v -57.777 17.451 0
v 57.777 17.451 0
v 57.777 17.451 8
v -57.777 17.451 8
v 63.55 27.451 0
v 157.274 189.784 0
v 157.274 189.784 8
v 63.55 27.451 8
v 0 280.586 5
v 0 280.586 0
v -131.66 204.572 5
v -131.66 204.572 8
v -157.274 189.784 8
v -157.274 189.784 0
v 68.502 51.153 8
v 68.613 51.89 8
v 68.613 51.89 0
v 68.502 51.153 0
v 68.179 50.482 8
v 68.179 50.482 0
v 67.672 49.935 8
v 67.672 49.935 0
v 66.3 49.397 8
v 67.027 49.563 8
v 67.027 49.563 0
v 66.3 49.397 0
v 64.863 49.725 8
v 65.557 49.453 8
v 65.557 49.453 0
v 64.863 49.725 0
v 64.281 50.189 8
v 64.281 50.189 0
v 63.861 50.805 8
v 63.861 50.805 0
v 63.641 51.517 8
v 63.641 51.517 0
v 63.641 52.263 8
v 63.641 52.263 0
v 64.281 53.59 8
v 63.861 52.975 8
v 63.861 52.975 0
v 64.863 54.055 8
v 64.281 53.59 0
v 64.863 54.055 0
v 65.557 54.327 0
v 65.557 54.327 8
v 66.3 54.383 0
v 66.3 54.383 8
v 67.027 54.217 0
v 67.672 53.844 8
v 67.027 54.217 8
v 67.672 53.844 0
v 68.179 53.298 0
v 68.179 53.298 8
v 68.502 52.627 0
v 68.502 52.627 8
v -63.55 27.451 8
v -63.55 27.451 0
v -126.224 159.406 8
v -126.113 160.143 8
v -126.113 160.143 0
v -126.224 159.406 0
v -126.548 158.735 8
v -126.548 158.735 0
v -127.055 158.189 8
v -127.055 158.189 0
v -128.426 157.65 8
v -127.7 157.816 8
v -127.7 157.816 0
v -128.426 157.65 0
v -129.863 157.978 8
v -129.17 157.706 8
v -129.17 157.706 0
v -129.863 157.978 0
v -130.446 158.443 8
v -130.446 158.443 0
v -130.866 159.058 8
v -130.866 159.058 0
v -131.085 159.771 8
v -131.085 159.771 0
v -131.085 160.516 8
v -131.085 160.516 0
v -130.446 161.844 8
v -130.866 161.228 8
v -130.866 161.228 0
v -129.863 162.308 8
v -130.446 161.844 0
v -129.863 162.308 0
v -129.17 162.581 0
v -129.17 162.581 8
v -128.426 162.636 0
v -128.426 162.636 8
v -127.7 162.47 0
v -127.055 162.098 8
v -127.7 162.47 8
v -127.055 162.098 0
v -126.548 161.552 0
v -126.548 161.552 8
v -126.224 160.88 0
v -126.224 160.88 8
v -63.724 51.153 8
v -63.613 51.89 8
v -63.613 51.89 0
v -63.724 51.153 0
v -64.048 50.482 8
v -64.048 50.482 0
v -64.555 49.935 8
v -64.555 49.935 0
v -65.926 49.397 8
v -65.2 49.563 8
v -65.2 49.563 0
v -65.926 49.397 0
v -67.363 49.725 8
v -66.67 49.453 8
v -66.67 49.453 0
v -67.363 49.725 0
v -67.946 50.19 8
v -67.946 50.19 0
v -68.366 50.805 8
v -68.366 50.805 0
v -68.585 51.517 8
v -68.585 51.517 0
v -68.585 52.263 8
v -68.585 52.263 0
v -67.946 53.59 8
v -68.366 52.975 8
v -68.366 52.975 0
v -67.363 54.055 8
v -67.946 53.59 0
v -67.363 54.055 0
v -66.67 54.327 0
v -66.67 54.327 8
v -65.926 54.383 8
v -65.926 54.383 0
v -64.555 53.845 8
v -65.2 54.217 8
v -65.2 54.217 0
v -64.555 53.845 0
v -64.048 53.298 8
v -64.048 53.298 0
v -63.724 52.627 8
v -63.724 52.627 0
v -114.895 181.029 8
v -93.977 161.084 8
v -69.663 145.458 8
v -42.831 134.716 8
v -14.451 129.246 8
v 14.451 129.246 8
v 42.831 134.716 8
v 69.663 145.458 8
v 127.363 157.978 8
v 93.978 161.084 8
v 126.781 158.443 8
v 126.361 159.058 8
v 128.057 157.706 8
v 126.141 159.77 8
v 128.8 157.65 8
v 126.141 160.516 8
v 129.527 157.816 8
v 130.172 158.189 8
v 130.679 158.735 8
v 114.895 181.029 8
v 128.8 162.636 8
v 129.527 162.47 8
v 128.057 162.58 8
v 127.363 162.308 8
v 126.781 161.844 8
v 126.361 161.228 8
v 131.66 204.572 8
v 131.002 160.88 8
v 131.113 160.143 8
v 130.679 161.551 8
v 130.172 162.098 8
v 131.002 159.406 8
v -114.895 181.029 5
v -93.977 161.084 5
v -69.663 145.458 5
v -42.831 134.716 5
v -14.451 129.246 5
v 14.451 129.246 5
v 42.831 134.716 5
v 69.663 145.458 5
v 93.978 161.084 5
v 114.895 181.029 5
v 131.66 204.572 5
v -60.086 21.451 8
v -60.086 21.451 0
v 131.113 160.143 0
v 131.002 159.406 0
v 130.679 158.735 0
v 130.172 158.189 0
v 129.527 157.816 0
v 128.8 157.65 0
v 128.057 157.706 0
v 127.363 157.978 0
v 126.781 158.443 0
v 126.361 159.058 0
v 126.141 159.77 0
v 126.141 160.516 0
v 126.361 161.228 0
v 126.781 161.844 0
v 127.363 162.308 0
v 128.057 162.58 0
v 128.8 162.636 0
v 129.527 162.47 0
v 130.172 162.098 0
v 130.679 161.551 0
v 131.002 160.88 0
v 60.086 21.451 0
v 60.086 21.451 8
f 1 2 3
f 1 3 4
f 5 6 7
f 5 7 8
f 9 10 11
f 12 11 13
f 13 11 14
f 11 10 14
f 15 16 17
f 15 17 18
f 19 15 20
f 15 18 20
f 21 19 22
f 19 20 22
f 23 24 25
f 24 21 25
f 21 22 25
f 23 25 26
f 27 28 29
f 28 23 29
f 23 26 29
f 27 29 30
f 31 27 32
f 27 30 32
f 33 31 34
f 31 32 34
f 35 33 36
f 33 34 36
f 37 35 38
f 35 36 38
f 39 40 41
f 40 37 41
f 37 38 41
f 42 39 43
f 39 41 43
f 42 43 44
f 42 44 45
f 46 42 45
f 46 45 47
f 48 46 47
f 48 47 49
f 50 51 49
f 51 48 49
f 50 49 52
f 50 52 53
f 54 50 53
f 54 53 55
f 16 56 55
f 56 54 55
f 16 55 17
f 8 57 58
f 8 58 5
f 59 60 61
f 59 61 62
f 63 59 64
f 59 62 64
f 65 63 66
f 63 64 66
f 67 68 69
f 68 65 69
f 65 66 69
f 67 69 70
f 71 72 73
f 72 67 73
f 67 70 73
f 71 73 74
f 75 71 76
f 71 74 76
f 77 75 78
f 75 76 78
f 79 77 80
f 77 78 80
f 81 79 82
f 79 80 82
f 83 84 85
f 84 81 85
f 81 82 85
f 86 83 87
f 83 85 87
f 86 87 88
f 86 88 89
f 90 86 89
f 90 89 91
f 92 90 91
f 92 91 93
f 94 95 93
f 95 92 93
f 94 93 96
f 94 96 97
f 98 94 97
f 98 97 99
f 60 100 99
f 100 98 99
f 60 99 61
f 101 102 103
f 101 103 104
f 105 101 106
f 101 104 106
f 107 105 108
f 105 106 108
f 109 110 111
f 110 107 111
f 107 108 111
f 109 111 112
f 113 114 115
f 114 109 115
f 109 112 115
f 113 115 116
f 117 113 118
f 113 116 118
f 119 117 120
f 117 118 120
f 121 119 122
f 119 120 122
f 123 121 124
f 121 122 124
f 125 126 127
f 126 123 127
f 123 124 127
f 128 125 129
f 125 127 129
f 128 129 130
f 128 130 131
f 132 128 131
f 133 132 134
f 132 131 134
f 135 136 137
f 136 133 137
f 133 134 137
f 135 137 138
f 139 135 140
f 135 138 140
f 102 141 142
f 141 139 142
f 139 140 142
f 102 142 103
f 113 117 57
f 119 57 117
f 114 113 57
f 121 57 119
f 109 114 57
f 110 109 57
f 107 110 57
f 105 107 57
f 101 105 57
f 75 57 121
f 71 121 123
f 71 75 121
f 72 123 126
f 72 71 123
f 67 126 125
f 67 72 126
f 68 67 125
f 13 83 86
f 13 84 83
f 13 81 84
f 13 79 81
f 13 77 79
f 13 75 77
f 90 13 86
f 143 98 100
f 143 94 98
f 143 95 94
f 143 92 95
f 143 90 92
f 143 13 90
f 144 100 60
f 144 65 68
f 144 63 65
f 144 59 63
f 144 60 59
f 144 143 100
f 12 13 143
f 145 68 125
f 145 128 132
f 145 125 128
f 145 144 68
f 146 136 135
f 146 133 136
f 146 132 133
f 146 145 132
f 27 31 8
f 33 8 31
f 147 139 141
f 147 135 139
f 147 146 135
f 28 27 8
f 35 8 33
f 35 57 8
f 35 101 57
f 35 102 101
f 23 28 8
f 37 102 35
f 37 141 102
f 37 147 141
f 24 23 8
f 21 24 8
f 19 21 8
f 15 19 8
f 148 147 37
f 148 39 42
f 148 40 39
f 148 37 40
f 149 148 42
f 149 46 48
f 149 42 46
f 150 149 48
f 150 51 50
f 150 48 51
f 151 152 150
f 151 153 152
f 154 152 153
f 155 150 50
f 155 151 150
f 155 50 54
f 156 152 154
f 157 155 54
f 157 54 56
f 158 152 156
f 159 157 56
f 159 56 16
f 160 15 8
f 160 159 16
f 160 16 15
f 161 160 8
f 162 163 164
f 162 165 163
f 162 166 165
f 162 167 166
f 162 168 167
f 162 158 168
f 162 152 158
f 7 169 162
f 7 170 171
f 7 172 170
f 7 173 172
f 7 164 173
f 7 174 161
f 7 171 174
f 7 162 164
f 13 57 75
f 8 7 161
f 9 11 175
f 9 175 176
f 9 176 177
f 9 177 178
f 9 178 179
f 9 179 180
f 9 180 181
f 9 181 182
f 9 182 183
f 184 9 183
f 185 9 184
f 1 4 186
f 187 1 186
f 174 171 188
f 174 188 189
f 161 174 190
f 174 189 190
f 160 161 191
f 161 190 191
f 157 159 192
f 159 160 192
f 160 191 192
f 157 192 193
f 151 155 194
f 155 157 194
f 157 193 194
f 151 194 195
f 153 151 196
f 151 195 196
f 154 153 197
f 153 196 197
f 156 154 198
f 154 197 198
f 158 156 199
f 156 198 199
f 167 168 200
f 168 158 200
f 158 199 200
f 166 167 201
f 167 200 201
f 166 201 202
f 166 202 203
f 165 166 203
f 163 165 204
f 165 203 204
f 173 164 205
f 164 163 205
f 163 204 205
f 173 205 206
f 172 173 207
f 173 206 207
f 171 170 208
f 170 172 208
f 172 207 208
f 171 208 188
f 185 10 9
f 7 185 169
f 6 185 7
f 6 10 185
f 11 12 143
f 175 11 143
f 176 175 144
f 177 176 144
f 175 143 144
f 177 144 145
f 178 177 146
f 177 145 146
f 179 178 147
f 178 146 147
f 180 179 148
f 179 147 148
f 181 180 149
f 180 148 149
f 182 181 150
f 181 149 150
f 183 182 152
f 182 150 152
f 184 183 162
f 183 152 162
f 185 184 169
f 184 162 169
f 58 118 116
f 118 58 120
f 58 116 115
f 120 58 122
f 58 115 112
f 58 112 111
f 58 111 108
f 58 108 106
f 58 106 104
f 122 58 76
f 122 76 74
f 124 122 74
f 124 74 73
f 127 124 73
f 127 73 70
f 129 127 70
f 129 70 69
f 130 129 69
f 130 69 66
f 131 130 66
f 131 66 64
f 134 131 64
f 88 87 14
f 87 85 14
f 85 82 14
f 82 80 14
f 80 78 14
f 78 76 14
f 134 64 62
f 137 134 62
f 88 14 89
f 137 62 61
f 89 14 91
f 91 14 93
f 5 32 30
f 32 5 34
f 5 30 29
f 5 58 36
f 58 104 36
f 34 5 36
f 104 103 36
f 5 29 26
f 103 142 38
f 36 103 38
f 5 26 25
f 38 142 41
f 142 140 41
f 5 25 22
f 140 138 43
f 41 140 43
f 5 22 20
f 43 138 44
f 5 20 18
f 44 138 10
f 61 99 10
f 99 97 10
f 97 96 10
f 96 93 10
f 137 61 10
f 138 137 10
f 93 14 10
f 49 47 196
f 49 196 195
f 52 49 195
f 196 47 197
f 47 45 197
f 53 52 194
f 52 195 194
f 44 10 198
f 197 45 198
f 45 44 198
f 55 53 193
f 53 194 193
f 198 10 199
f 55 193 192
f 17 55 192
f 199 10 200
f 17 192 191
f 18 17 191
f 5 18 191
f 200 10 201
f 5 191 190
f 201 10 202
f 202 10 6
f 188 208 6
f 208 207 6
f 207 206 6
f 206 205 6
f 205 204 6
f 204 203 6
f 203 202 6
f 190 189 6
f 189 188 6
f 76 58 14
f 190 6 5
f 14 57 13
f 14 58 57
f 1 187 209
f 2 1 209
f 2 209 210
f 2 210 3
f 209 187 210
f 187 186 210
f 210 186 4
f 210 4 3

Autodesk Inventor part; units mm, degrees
ref_plane "YZ Plane" through (0, 0, 0) normal (1, 0, 0) x (0, 1, 0)
ref_plane "XZ Plane" through (0, 0, 0) normal (0, 1, 0) x (-1, 0, 0)
ref_plane "XY Plane" through (0, 0, 0) normal (0, 0, 1) x (1, 0, 0)
sketch "Sketch1" plane through (0, 0, 0) normal (0, 0, 1) x (1, 0, 0)
  arc A0 (-16.5011, 13.8506) -> (-21.6973, 4.8506) centre (-16.5011, 7.8506) ccw projected
  line L0 (-16.5011, 13.8506) -> (16.5011, 13.8506) projected
  arc A1 (21.6973, 4.8506) -> (16.5011, 13.8506) centre (16.5011, 7.8506) ccw projected
  line L1 (21.6973, 4.8506) -> (13.3257, -9.6494) projected
  arc A2 (5.5315, -14.1494) -> (13.3257, -9.6494) centre (5.5315, -5.1494) ccw projected
  line L2 (5.5315, -14.1494) -> (-5.5315, -14.1494) projected
  arc A3 (-13.3257, -9.6494) -> (-5.5315, -14.1494) centre (-5.5315, -5.1494) ccw projected
  line L3 (-13.3257, -9.6494) -> (-21.6973, 4.8506) projected
  line L4 (10, -20.5494) -> (10, -40.5494) projected
  line L5 (10, -40.5494) -> (-10, -40.5494) projected
  line L6 (-10, -40.5494) -> (-10, -20.5494) projected
  line L7 (-10, -20.5494) -> (10, -20.5494) projected
  line L8 (-15, -16.7494) -> (-32.2735, -26.7222) projected
  arc A4 (-32.2735, -26.7222) -> (32.2735, -26.7222) centre (0, -5.7301) ccw projected
  line L9 (32.2735, -26.7222) -> (15, -16.7494) projected
  line L10 (23.4871, 17.4506) -> (-23.4871, 17.4506)
  arc A5 (-222.749, 428.2443) -> (-227.9452, 437.2443) centre (-227.9452, 431.2443) ccw projected
  line L11 (-222.749, 428.2443) -> (-239.2501, 399.6635) projected
  arc A6 (-249.6424, 399.6635) -> (-239.2501, 399.6635) centre (-244.4463, 402.6635) ccw projected
  line L12 (-249.6424, 399.6635) -> (-258.014, 414.1635) projected
  arc A7 (-258.014, 423.1635) -> (-258.014, 414.1635) centre (-250.2198, 418.6635) ccw projected
  line L13 (-258.014, 423.1635) -> (-252.4825, 432.7443) projected
  arc A8 (-244.6883, 437.2443) -> (-252.4825, 432.7443) centre (-244.6883, 428.2443) ccw projected
  line L14 (-244.6883, 437.2443) -> (-227.9452, 437.2443) projected
  line L15 (-265.7908, 422.4937) -> (-283.1113, 432.4937) projected
  line L16 (-283.1113, 432.4937) -> (-273.1113, 449.8142) projected
  line L17 (-273.1113, 449.8142) -> (-255.7908, 439.8142) projected
  line L18 (-255.7908, 439.8142) -> (-265.7908, 422.4937) projected
  line L19 (-193.9999, 442.2443) -> (-249.9999, 442.2443) projected
  line L20 (-249.9999, 442.2443) -> (-249.9999, 462.19) projected
  arc A9 (-249.9999, 462.19) -> (-282.2735, 406.2907) centre (-247.957, 423.7443) ccw projected
  line L21 (-282.2735, 406.2907) -> (-264.9999, 416.2635) projected
  line L22 (-264.9999, 416.2635) -> (-237, 367.7661) projected
  line L23 (-237, 367.7661) -> (-232.6699, 370.2661) projected
  line L24 (-232.6699, 370.2661) -> (-239.6254, 382.3135) projected
  arc A10 (-239.6254, 391.8135) -> (-239.6254, 382.3135) centre (-231.3982, 387.0635) ccw projected
  line L25 (-239.6254, 391.8135) -> (-216.1383, 432.4943) projected
  arc A11 (-207.9111, 437.2443) -> (-216.1383, 432.4943) centre (-207.9111, 427.7443) ccw projected
  line L26 (-207.9111, 437.2443) -> (-193.9999, 437.2443) projected
  line L27 (-193.9999, 437.2443) -> (-193.9999, 442.2443) projected
  arc A12 (239.2502, 399.6633) -> (249.6425, 399.6633) centre (244.4464, 402.6633) ccw projected
  line L28 (239.2502, 399.6633) -> (222.7491, 428.2441) projected
  arc A13 (227.9453, 437.2441) -> (222.7491, 428.2441) centre (227.9453, 431.2441) ccw projected
  line L29 (227.9453, 437.2441) -> (244.6884, 437.2441) projected
  arc A14 (252.4827, 432.7441) -> (244.6884, 437.2441) centre (244.6884, 428.2441) ccw projected
  line L30 (252.4827, 432.7441) -> (258.0141, 423.1633) projected
  arc A15 (258.0141, 414.1633) -> (258.0141, 423.1633) centre (250.2199, 418.6633) ccw projected
  line L31 (258.0141, 414.1633) -> (249.6425, 399.6633) projected
  line L32 (255.791, 439.8139) -> (273.1115, 449.8139) projected
  line L33 (273.1115, 449.8139) -> (283.1115, 432.4934) projected
  line L34 (283.1115, 432.4934) -> (265.791, 422.4934) projected
  line L35 (265.791, 422.4934) -> (255.791, 439.8139) projected
  line L36 (237.0001, 367.7659) -> (265.0001, 416.2633) projected
  line L37 (265.0001, 416.2633) -> (282.2736, 406.2904) projected
  arc A16 (282.2736, 406.2904) -> (250.0001, 462.1898) centre (247.9571, 423.7441) ccw projected
  line L38 (250.0001, 462.1898) -> (250.0001, 442.2441) projected
  line L39 (250.0001, 442.2441) -> (194.0001, 442.2441) projected
  line L40 (194.0001, 442.2441) -> (194.0001, 437.2441) projected
  line L41 (194.0001, 437.2441) -> (207.9112, 437.2441) projected
  arc A17 (216.1385, 432.4941) -> (207.9112, 437.2441) centre (207.9112, 427.7441) ccw projected
  line L42 (216.1385, 432.4941) -> (239.6255, 391.8133) projected
  arc A18 (239.6255, 382.3133) -> (239.6255, 391.8133) centre (231.3983, 387.0633) ccw projected
  line L43 (239.6255, 382.3133) -> (232.6699, 370.2659) projected
  line L44 (232.6699, 370.2659) -> (237.0001, 367.7659) projected
  line L45 (-249.9999, 462.19) -> (250.0001, 462.1898)
  line L46 (282.2736, 406.2904) -> (32.2735, -26.7222)
  line L47 (-32.2735, -26.7222) -> (-282.2735, 406.2907)
  line L48 (-23.4871, 17.4506) -> (-57.7767, 17.4506)
  line L49 (23.4871, 17.4506) -> (57.7768, 17.4506)
  line L50 (0, 0) -> (0.0001, 280.5856)
  line L51 (-247.957, 423.7443) -> (0.0001, 280.5856)
  line L52 (247.9571, 423.7441) -> (0.0001, 280.5856)
  line L53 (0.0001, 280.5856) -> (-157.2735, 189.7842)
  line L54 (0.0001, 280.5856) -> (157.2736, 189.7841)
  line L55 (0.0001, 280.5856) -> (0.0001, 462.1899)
  circle A19 centre (-128.6133, 160.1432) radius 2.5
  circle A20 centre (-66.1133, 51.89) radius 2.5
  circle A21 centre (66.1133, 51.8899) radius 2.5
  circle A22 centre (128.6133, 160.1431) radius 2.5
  dimension "d0" = 5
  dimension "d1" = 5
  dimension "d2" = 5
  dimension "d3" = 5
  dimension "d4" = 10
  dimension "d5" = 10
  dimension "d6" = 10
  dimension "d7" = 10
  dimension "d8" = 40
  dimension "d9" = 40
  dimension "d10" = 125
  dimension "d11" = 125
extrude "Extrusion1" add sketch "Sketch1" along normal blind 8 contours L10 L48 L47 L53 L50 | L50 L54 L46 L49 L10
sketch "Sketch2" plane through (0, 0, 8) normal (0, 0, 1) x (1, 0, 0)
  line L0 (-107.5, 173.0861) -> (107.5, 173.0861) projected
  line L1 (107.5, 173.0861) -> (107.5, 388.0861) projected
  line L2 (107.5, 388.0861) -> (-107.5, 388.0861) projected
  line L3 (-107.5, 388.0861) -> (-107.5, 173.0861) projected
  circle A0 centre (0.0001, 280.5856) radius 152.0277
  point P0 (0, 0)
extrude "Extrusion2" cut sketch "Sketch2" against normal blind 3
sketch "Sketch3" plane through (0, 0, 8) normal (0, 0, 1) x (1, 0, 0)
  line L0 (-63.5502, 27.4506) -> (63.5503, 27.4506)
  line L1 (-63.5502, 27.4506) -> (-57.7767, 17.4506)
  line L2 (-57.7767, 17.4506) -> (57.7768, 17.4506) projected
  line L3 (57.7768, 17.4506) -> (60.0862, 21.4506)
  line L4 (-60.0861, 21.4506) -> (60.0862, 21.4506)
  line L5 (60.0862, 21.4506) -> (63.5503, 27.4506)
  point P0 (0, 0)
  dimension "d16" = 10
extrude "Extrusion3" cut sketch "Sketch3" against normal through all contours L0 L5 L4 L1
equation "\"d5\" = d4"
equation "\"d6\" = d4"
equation "\"d7\" = d6"
equation "\"d9\" = d8"
equation "\"d11\" = d10"
properties part number "bottom top plate"
